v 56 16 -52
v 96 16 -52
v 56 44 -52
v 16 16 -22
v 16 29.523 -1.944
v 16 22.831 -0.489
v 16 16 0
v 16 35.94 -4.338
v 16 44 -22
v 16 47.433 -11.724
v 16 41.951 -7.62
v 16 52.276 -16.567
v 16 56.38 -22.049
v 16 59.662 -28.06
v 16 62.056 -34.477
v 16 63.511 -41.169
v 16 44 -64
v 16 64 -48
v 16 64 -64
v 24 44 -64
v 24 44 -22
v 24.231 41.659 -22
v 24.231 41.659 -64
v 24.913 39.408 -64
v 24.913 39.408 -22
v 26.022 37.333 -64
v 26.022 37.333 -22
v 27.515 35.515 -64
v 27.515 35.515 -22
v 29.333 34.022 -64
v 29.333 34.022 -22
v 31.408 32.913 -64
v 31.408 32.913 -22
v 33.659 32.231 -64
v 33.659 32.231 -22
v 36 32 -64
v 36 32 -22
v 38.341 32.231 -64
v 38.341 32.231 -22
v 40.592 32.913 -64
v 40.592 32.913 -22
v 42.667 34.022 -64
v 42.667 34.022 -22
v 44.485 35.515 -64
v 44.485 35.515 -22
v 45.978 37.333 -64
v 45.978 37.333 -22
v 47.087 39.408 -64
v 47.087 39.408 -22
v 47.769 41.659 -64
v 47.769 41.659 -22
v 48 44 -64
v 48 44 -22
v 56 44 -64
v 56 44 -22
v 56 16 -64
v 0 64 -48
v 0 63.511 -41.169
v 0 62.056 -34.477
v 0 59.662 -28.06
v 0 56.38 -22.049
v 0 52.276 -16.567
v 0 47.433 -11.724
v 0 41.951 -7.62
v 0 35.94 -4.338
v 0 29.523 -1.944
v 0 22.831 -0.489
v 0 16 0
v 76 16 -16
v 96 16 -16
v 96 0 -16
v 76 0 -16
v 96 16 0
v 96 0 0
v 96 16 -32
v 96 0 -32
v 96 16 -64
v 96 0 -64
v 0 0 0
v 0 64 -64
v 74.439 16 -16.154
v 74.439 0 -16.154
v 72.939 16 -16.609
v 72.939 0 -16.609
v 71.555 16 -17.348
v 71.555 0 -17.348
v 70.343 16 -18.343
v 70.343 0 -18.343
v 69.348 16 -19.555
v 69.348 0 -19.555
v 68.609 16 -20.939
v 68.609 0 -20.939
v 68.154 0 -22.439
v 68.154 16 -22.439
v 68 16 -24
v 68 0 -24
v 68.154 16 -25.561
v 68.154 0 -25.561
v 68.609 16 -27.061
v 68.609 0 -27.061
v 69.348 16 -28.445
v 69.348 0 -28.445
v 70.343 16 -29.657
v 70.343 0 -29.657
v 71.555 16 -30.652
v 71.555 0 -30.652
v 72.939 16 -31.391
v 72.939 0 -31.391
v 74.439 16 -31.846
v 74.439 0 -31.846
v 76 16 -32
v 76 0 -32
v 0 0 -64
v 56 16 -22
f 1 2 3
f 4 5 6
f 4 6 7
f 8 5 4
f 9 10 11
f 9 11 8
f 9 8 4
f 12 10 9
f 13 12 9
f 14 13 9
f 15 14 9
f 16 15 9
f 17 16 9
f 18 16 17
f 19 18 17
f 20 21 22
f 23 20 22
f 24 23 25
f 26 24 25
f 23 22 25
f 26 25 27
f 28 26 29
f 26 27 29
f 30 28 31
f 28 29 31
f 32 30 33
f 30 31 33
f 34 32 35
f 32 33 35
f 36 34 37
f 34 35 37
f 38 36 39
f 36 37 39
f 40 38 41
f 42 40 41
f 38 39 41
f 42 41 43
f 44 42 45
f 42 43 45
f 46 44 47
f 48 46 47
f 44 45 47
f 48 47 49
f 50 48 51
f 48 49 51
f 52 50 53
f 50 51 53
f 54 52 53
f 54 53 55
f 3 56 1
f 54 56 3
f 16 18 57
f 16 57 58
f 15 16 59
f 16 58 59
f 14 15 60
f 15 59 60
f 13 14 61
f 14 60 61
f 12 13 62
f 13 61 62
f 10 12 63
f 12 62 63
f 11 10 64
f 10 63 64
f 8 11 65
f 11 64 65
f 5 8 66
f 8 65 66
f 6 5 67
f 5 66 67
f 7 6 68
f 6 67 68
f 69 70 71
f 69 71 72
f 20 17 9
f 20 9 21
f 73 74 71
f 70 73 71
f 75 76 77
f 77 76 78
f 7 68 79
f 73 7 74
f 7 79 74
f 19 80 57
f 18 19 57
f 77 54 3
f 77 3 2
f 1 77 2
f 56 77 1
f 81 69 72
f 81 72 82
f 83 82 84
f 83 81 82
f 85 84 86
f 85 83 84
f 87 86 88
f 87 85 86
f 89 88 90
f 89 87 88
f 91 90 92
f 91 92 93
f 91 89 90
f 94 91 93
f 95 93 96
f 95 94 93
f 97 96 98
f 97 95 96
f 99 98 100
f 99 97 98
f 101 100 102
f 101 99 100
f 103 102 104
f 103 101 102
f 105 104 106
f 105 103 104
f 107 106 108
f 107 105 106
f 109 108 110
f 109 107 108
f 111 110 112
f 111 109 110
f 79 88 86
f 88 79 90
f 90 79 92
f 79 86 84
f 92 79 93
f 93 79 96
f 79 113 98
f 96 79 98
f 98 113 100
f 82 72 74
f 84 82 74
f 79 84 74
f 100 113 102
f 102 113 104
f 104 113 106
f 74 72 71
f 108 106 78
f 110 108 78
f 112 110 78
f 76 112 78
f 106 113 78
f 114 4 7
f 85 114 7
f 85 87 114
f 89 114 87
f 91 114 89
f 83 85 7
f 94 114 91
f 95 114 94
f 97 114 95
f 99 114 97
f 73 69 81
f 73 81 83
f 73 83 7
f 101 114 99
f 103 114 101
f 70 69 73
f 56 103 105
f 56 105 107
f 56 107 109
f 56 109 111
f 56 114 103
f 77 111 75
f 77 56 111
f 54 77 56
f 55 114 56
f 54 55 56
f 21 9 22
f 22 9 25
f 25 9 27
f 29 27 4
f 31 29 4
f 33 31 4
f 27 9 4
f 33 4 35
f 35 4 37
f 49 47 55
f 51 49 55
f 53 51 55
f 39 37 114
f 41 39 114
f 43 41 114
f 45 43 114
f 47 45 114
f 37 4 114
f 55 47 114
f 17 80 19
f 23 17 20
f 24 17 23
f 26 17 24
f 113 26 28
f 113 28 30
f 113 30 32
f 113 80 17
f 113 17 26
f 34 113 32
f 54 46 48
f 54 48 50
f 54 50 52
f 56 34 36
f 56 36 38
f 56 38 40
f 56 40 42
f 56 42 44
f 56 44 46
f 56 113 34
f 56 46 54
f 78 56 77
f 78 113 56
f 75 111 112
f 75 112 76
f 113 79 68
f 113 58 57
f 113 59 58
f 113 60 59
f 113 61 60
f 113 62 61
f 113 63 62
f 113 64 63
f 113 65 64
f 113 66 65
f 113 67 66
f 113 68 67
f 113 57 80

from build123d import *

# Parameters (mm, degrees)
SKETCH1_W           = 96
SKETCH1_H           = 64
BOSS_EXTRUDE1_DEPTH = 16
CUT_EXTRUDE1_DEPTH  = 16
BOSS_EXTRUDE2_DEPTH = 16
SKETCH4_W           = 40
SKETCH4_H           = 42
BOSS_EXTRUDE3_DEPTH = 28
CUT_EXTRUDE2_REACH  = 44
SKETCH5_R           = 12
BOSS_EXTRUDE4_DEPTH = 12


with BuildPart() as part:
    # Sketch1 → Boss-Extrude1 (new body)
    with BuildSketch(Plane(origin=(0, 0, 0), x_dir=(1, 0, 0), z_dir=(0, 1, 0))):
        with Locations((48, 32)):
            Rectangle(SKETCH1_W, SKETCH1_H)
    extrude(amount=BOSS_EXTRUDE1_DEPTH)

    # Sketch2 → Cut-Extrude1 (cut)
    with BuildSketch(Plane(origin=(0, 16, 0), x_dir=(1, 0, 0), z_dir=(0, 1, 0))):
        with BuildLine():
            Line((96, 16), (76, 16))
            ThreePointArc((76, 16), (68, 24), (76, 32))
            Line((76, 32), (96, 32))
            ThreePointArc((96, 32), (104, 24), (96, 16))
        make_face()
    extrude(amount=-CUT_EXTRUDE1_DEPTH, mode=Mode.SUBTRACT)

    # Sketch3 → Boss-Extrude2 (add)
    with BuildSketch(Plane.ZY):
        with BuildLine():
            Line((0, 0), (-64, 0))
            Line((-64, 0), (-64, 64))
            Line((-64, 64), (-48, 64))
            ThreePointArc((-48, 64), (-14.058874503, 49.941125497), (0, 16))
            Line((0, 16), (0, 0))
        make_face()
    extrude(amount=-BOSS_EXTRUDE2_DEPTH)

    # Sketch4 → Boss-Extrude3 (add)
    with BuildSketch(Plane(origin=(0, 16, 0), x_dir=(1, 0, 0), z_dir=(0, 1, 0))):
        with Locations((36, 43)):
            Rectangle(SKETCH4_W, SKETCH4_H)
    extrude(amount=BOSS_EXTRUDE3_DEPTH)

    # Sketch5 → Cut-Extrude2 (cut, up to next)
    with BuildSketch(Plane.XY.offset(-22), mode=Mode.PRIVATE) as cut_extrude2_sk1:
        with Locations((36, 44)):
            Circle(SKETCH5_R)
    cut_extrude2_tool1 = extrude(cut_extrude2_sk1.sketch, amount=-CUT_EXTRUDE2_REACH, mode=Mode.PRIVATE) & part.part
    add(cut_extrude2_tool1.solids().sort_by_distance((36, 44, -22))[0], mode=Mode.SUBTRACT)


with BuildPart() as body_2:
    # Sketch6 → Boss-Extrude4 (new body)
    with BuildSketch(Plane(origin=(0, 0, -64), x_dir=(-1, 0, 0), z_dir=(0, 0, -1))):
        Polygon((-56, 44), (-96, 16), (-56, 16), align=None)
    extrude(amount=-BOSS_EXTRUDE4_DEPTH)


solid = Compound([part.part, body_2.part])
